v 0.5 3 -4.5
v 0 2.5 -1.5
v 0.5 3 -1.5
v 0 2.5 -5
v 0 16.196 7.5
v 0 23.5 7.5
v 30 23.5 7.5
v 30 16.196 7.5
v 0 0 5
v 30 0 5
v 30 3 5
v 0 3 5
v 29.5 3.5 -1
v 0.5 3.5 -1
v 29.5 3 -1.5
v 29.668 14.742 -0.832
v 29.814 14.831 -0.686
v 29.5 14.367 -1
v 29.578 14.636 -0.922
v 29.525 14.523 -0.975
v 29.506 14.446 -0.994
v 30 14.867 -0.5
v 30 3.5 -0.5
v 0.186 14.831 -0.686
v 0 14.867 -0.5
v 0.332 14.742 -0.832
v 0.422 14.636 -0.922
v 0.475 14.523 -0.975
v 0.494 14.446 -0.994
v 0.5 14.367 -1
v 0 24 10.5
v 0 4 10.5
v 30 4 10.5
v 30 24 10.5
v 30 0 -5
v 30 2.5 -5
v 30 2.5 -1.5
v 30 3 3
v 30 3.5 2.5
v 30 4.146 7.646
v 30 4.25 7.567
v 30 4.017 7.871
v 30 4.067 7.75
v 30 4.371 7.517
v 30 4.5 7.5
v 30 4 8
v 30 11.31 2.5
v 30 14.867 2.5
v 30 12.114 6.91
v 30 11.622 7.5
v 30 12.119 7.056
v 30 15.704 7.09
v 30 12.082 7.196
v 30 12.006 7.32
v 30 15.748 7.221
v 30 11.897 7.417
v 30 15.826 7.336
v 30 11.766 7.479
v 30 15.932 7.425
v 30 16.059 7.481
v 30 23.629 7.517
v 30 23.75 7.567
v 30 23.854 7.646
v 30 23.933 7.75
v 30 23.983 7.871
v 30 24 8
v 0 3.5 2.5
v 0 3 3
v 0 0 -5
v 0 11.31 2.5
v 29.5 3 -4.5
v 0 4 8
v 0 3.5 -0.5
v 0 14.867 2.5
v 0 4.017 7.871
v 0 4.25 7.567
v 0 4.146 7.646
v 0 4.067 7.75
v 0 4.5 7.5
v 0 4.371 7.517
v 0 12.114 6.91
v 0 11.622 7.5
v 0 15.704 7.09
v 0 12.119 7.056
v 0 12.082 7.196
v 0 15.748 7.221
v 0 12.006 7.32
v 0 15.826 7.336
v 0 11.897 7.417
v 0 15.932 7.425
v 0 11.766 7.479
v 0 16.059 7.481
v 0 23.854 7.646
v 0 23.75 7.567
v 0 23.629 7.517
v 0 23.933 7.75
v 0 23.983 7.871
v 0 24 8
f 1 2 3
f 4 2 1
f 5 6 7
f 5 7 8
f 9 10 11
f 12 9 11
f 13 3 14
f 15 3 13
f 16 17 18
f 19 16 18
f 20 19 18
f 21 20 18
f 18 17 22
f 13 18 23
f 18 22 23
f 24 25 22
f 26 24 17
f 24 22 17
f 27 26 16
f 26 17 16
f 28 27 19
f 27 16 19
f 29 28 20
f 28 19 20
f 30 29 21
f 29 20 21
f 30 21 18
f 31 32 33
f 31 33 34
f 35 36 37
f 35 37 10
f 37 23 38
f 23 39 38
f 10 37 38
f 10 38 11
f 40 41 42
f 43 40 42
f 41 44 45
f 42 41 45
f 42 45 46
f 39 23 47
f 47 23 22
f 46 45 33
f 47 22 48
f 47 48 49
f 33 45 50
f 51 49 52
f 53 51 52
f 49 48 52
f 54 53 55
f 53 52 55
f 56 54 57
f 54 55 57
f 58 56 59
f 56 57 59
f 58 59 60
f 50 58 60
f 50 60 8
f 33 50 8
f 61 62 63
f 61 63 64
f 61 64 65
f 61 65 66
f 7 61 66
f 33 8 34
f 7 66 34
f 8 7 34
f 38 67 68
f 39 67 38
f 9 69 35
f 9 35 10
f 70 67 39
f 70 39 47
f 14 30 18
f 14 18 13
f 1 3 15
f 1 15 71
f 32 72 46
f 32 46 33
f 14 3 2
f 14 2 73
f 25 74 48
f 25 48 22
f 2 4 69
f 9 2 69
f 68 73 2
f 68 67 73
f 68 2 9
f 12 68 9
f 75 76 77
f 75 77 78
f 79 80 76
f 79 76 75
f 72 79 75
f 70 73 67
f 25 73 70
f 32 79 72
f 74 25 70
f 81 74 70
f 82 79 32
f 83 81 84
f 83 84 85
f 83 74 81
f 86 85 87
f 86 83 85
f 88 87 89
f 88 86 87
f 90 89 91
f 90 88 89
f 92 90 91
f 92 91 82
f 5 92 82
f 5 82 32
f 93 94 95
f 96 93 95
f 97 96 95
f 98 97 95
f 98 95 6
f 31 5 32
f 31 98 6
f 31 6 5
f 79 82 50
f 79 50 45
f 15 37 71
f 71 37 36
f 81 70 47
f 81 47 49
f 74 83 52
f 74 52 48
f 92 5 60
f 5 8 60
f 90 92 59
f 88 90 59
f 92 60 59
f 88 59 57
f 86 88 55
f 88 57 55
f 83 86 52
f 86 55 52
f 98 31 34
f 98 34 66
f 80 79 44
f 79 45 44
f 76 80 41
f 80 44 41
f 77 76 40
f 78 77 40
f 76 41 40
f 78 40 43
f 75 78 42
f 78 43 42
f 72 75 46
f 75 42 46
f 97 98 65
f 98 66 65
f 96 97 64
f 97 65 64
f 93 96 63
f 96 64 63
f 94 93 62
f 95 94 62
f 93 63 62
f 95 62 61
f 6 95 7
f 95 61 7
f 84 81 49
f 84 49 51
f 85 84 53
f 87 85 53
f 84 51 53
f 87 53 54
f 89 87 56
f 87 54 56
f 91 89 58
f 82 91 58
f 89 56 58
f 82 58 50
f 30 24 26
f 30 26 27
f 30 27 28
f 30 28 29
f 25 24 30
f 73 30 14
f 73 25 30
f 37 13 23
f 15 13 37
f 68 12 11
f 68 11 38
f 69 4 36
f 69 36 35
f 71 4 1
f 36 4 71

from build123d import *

# Parameters (mm, degrees)
BOSS_EXTRUDE1_DEPTH = 30
CHAMFER1_SIZE       = 0.5
FILLET1_R           = 0.5


with BuildPart() as part:
    # Sketch1 → Boss-Extrude1 (new body)
    with BuildSketch(Plane(origin=(0, 0, 0), x_dir=(0, 0, -1), z_dir=(1, 0, 0))):
        Polygon((-5, 0), (-5, 3), (-2.5, 3), (-2.5, 11.309733412), (-7.5, 12.221162959), (-7.5, 4), (-10.5, 4), (-10.5, 24), (-7.5, 24), (-7.5, 15.778837041), (-2.5, 14.867407493), (1, 14.867407493), (1, 3), (5, 3), (5, 0), align=None)
    extrude(amount=BOSS_EXTRUDE1_DEPTH)

    # Chamfer1
    chamfer1_edges = [part.edges().sort_by_distance(p)[0] for p in [
        (15, 3, 2.5),
        (0, 3, -3),
        (30, 8.933703747, -1),
        (0, 8.933703747, -1),
        (15, 3, -5),
        (30, 3, -3),
        (15, 3, -1),
    ]]
    chamfer(chamfer1_edges, length=CHAMFER1_SIZE)

    # Fillet1
    fillet1_edges = [part.edges().sort_by_distance(p)[0] for p in [
        (15, 4, 7.5),
        (15, 24, 7.5),
        (15, 12.221162959, 7.5),
        (15, 15.778837041, 7.5),
        (15, 14.867407493, -1),
    ]]
    fillet(fillet1_edges, radius=FILLET1_R)


solid = part.part
